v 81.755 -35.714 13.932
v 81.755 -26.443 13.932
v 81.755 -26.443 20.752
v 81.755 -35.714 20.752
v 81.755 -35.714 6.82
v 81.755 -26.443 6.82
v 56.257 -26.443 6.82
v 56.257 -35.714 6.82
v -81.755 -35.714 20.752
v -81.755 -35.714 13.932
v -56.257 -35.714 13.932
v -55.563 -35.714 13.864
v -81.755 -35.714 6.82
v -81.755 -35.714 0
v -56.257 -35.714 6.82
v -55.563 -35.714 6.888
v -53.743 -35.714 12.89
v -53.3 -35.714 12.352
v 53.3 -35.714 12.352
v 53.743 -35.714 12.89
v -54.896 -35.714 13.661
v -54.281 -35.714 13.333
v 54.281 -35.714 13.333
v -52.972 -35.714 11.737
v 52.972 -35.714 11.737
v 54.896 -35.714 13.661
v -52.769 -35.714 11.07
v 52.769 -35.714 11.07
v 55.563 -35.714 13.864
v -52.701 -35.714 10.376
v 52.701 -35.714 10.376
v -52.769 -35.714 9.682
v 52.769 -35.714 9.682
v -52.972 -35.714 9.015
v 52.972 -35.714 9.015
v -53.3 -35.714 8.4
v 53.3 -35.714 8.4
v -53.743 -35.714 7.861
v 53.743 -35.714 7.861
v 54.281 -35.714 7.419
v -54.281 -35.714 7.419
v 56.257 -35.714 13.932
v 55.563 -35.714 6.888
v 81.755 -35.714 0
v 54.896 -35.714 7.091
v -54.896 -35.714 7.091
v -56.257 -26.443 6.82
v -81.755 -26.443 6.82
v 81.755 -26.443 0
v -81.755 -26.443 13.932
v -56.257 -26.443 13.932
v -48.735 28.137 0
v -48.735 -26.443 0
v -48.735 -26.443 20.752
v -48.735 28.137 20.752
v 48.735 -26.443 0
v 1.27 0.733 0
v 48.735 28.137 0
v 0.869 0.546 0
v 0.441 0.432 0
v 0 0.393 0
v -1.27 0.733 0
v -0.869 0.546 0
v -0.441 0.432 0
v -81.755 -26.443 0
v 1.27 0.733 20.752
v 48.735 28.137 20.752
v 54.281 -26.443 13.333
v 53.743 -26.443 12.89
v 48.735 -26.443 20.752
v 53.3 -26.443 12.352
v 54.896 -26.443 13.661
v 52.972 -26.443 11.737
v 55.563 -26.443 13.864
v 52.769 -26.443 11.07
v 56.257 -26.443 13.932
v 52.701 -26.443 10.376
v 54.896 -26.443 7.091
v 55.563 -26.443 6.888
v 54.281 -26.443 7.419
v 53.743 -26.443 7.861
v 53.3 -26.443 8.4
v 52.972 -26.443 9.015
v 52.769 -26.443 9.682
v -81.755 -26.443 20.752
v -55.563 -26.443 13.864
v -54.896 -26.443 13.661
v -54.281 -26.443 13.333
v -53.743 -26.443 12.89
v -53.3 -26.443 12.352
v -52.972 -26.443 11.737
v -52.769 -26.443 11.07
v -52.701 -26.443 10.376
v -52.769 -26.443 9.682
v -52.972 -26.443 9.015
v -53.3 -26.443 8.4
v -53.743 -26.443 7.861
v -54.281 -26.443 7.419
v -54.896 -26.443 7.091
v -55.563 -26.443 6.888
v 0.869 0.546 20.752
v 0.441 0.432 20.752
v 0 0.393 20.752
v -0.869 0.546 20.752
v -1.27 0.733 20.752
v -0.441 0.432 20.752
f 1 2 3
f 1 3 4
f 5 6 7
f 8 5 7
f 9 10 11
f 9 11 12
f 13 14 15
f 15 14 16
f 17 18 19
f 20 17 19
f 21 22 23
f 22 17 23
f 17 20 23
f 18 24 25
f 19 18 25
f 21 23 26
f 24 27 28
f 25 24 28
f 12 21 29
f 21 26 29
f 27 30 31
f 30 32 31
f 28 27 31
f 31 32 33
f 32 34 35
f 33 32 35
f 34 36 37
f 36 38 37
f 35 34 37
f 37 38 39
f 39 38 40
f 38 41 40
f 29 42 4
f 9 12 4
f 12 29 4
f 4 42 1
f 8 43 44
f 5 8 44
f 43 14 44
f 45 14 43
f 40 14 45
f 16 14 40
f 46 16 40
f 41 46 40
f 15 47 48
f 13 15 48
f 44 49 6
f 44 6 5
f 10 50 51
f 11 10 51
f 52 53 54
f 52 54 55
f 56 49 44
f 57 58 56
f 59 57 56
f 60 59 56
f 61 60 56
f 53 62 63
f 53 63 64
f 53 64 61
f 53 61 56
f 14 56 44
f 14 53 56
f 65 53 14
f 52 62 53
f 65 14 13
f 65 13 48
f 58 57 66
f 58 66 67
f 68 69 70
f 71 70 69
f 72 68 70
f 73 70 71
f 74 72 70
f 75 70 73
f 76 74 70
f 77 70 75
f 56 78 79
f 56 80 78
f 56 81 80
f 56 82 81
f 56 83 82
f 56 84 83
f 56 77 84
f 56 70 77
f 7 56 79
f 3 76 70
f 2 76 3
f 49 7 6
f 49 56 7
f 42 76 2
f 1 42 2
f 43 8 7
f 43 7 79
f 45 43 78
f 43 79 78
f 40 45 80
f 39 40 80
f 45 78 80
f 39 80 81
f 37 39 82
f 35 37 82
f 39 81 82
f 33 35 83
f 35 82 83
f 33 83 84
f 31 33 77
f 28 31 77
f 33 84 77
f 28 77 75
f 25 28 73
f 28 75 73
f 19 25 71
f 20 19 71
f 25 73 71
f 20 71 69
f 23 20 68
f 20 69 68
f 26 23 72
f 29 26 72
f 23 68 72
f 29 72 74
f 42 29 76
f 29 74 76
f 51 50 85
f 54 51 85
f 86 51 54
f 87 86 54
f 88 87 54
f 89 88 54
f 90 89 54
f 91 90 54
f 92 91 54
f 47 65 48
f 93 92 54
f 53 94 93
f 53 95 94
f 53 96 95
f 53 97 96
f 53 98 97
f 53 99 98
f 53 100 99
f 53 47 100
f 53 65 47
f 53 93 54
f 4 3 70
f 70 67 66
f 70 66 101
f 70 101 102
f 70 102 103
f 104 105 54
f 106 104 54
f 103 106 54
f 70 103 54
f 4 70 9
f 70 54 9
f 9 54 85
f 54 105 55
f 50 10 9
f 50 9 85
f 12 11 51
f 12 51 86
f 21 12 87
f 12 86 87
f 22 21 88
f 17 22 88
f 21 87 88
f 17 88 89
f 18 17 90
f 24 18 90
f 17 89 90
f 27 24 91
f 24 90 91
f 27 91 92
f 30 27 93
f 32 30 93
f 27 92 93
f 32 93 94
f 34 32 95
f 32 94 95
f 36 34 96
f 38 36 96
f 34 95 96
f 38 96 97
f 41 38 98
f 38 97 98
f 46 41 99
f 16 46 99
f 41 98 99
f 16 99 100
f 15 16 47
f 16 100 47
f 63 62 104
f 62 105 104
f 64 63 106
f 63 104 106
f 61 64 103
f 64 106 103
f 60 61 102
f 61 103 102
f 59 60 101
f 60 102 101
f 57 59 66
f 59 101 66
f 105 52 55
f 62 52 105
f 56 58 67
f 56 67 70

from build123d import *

# Parameters (mm, degrees)
BOSS_EXTRUDE1_DEPTH = 20.7518
CUT_EXTRUDE1_DEPTH  = 10
FILLET1_R           = 2.54


with BuildPart() as part:
    # Sketch1 → Boss-Extrude1 (new body)
    with BuildSketch(Plane.XY):
        Polygon((-48.735, 28.137165369), (0, 0), (48.735, 28.137165369), (48.735, -26.443474646), (81.755, -26.443474646), (81.755, -35.714474646), (81.623037502, -35.714474646), (-81.623037502, -35.714474646), (-81.755, -35.714474646), (-81.755, -26.443474646), (-48.735, -26.443474646), align=None)
    extrude(amount=BOSS_EXTRUDE1_DEPTH)

    # Sketch2 → Cut-Extrude1 (cut)
    with BuildSketch(Plane(origin=(0, -26.443474646, 0), x_dir=(1, 0, 0), z_dir=(0, 1, 0))):
        with BuildLine():
            Line((-56.257083812, -6.8199), (-81.755, -6.8199))
            Line((-81.755, -6.8199), (-81.755, -13.9319))
            Line((-81.755, -13.9319), (-56.257083812, -13.9319))
            ThreePointArc((-56.257083812, -13.9319), (-52.701083812, -10.3759), (-56.257083812, -6.8199))
        make_face()
        with BuildLine():
            Line((81.755, -13.9319), (81.755, -6.8199))
            Line((81.755, -6.8199), (56.257083812, -6.8199))
            ThreePointArc((56.257083812, -6.8199), (52.701083812, -10.3759), (56.257083812, -13.9319))
            Line((56.257083812, -13.9319), (81.755, -13.9319))
        make_face()
    extrude(amount=-CUT_EXTRUDE1_DEPTH, mode=Mode.SUBTRACT)

    # Fillet1
    fillet1_edges = [part.edges().sort_by_distance(p)[0] for p in [
        (0, 0, 10.3759),
    ]]
    fillet(fillet1_edges, radius=FILLET1_R)


solid = part.part
